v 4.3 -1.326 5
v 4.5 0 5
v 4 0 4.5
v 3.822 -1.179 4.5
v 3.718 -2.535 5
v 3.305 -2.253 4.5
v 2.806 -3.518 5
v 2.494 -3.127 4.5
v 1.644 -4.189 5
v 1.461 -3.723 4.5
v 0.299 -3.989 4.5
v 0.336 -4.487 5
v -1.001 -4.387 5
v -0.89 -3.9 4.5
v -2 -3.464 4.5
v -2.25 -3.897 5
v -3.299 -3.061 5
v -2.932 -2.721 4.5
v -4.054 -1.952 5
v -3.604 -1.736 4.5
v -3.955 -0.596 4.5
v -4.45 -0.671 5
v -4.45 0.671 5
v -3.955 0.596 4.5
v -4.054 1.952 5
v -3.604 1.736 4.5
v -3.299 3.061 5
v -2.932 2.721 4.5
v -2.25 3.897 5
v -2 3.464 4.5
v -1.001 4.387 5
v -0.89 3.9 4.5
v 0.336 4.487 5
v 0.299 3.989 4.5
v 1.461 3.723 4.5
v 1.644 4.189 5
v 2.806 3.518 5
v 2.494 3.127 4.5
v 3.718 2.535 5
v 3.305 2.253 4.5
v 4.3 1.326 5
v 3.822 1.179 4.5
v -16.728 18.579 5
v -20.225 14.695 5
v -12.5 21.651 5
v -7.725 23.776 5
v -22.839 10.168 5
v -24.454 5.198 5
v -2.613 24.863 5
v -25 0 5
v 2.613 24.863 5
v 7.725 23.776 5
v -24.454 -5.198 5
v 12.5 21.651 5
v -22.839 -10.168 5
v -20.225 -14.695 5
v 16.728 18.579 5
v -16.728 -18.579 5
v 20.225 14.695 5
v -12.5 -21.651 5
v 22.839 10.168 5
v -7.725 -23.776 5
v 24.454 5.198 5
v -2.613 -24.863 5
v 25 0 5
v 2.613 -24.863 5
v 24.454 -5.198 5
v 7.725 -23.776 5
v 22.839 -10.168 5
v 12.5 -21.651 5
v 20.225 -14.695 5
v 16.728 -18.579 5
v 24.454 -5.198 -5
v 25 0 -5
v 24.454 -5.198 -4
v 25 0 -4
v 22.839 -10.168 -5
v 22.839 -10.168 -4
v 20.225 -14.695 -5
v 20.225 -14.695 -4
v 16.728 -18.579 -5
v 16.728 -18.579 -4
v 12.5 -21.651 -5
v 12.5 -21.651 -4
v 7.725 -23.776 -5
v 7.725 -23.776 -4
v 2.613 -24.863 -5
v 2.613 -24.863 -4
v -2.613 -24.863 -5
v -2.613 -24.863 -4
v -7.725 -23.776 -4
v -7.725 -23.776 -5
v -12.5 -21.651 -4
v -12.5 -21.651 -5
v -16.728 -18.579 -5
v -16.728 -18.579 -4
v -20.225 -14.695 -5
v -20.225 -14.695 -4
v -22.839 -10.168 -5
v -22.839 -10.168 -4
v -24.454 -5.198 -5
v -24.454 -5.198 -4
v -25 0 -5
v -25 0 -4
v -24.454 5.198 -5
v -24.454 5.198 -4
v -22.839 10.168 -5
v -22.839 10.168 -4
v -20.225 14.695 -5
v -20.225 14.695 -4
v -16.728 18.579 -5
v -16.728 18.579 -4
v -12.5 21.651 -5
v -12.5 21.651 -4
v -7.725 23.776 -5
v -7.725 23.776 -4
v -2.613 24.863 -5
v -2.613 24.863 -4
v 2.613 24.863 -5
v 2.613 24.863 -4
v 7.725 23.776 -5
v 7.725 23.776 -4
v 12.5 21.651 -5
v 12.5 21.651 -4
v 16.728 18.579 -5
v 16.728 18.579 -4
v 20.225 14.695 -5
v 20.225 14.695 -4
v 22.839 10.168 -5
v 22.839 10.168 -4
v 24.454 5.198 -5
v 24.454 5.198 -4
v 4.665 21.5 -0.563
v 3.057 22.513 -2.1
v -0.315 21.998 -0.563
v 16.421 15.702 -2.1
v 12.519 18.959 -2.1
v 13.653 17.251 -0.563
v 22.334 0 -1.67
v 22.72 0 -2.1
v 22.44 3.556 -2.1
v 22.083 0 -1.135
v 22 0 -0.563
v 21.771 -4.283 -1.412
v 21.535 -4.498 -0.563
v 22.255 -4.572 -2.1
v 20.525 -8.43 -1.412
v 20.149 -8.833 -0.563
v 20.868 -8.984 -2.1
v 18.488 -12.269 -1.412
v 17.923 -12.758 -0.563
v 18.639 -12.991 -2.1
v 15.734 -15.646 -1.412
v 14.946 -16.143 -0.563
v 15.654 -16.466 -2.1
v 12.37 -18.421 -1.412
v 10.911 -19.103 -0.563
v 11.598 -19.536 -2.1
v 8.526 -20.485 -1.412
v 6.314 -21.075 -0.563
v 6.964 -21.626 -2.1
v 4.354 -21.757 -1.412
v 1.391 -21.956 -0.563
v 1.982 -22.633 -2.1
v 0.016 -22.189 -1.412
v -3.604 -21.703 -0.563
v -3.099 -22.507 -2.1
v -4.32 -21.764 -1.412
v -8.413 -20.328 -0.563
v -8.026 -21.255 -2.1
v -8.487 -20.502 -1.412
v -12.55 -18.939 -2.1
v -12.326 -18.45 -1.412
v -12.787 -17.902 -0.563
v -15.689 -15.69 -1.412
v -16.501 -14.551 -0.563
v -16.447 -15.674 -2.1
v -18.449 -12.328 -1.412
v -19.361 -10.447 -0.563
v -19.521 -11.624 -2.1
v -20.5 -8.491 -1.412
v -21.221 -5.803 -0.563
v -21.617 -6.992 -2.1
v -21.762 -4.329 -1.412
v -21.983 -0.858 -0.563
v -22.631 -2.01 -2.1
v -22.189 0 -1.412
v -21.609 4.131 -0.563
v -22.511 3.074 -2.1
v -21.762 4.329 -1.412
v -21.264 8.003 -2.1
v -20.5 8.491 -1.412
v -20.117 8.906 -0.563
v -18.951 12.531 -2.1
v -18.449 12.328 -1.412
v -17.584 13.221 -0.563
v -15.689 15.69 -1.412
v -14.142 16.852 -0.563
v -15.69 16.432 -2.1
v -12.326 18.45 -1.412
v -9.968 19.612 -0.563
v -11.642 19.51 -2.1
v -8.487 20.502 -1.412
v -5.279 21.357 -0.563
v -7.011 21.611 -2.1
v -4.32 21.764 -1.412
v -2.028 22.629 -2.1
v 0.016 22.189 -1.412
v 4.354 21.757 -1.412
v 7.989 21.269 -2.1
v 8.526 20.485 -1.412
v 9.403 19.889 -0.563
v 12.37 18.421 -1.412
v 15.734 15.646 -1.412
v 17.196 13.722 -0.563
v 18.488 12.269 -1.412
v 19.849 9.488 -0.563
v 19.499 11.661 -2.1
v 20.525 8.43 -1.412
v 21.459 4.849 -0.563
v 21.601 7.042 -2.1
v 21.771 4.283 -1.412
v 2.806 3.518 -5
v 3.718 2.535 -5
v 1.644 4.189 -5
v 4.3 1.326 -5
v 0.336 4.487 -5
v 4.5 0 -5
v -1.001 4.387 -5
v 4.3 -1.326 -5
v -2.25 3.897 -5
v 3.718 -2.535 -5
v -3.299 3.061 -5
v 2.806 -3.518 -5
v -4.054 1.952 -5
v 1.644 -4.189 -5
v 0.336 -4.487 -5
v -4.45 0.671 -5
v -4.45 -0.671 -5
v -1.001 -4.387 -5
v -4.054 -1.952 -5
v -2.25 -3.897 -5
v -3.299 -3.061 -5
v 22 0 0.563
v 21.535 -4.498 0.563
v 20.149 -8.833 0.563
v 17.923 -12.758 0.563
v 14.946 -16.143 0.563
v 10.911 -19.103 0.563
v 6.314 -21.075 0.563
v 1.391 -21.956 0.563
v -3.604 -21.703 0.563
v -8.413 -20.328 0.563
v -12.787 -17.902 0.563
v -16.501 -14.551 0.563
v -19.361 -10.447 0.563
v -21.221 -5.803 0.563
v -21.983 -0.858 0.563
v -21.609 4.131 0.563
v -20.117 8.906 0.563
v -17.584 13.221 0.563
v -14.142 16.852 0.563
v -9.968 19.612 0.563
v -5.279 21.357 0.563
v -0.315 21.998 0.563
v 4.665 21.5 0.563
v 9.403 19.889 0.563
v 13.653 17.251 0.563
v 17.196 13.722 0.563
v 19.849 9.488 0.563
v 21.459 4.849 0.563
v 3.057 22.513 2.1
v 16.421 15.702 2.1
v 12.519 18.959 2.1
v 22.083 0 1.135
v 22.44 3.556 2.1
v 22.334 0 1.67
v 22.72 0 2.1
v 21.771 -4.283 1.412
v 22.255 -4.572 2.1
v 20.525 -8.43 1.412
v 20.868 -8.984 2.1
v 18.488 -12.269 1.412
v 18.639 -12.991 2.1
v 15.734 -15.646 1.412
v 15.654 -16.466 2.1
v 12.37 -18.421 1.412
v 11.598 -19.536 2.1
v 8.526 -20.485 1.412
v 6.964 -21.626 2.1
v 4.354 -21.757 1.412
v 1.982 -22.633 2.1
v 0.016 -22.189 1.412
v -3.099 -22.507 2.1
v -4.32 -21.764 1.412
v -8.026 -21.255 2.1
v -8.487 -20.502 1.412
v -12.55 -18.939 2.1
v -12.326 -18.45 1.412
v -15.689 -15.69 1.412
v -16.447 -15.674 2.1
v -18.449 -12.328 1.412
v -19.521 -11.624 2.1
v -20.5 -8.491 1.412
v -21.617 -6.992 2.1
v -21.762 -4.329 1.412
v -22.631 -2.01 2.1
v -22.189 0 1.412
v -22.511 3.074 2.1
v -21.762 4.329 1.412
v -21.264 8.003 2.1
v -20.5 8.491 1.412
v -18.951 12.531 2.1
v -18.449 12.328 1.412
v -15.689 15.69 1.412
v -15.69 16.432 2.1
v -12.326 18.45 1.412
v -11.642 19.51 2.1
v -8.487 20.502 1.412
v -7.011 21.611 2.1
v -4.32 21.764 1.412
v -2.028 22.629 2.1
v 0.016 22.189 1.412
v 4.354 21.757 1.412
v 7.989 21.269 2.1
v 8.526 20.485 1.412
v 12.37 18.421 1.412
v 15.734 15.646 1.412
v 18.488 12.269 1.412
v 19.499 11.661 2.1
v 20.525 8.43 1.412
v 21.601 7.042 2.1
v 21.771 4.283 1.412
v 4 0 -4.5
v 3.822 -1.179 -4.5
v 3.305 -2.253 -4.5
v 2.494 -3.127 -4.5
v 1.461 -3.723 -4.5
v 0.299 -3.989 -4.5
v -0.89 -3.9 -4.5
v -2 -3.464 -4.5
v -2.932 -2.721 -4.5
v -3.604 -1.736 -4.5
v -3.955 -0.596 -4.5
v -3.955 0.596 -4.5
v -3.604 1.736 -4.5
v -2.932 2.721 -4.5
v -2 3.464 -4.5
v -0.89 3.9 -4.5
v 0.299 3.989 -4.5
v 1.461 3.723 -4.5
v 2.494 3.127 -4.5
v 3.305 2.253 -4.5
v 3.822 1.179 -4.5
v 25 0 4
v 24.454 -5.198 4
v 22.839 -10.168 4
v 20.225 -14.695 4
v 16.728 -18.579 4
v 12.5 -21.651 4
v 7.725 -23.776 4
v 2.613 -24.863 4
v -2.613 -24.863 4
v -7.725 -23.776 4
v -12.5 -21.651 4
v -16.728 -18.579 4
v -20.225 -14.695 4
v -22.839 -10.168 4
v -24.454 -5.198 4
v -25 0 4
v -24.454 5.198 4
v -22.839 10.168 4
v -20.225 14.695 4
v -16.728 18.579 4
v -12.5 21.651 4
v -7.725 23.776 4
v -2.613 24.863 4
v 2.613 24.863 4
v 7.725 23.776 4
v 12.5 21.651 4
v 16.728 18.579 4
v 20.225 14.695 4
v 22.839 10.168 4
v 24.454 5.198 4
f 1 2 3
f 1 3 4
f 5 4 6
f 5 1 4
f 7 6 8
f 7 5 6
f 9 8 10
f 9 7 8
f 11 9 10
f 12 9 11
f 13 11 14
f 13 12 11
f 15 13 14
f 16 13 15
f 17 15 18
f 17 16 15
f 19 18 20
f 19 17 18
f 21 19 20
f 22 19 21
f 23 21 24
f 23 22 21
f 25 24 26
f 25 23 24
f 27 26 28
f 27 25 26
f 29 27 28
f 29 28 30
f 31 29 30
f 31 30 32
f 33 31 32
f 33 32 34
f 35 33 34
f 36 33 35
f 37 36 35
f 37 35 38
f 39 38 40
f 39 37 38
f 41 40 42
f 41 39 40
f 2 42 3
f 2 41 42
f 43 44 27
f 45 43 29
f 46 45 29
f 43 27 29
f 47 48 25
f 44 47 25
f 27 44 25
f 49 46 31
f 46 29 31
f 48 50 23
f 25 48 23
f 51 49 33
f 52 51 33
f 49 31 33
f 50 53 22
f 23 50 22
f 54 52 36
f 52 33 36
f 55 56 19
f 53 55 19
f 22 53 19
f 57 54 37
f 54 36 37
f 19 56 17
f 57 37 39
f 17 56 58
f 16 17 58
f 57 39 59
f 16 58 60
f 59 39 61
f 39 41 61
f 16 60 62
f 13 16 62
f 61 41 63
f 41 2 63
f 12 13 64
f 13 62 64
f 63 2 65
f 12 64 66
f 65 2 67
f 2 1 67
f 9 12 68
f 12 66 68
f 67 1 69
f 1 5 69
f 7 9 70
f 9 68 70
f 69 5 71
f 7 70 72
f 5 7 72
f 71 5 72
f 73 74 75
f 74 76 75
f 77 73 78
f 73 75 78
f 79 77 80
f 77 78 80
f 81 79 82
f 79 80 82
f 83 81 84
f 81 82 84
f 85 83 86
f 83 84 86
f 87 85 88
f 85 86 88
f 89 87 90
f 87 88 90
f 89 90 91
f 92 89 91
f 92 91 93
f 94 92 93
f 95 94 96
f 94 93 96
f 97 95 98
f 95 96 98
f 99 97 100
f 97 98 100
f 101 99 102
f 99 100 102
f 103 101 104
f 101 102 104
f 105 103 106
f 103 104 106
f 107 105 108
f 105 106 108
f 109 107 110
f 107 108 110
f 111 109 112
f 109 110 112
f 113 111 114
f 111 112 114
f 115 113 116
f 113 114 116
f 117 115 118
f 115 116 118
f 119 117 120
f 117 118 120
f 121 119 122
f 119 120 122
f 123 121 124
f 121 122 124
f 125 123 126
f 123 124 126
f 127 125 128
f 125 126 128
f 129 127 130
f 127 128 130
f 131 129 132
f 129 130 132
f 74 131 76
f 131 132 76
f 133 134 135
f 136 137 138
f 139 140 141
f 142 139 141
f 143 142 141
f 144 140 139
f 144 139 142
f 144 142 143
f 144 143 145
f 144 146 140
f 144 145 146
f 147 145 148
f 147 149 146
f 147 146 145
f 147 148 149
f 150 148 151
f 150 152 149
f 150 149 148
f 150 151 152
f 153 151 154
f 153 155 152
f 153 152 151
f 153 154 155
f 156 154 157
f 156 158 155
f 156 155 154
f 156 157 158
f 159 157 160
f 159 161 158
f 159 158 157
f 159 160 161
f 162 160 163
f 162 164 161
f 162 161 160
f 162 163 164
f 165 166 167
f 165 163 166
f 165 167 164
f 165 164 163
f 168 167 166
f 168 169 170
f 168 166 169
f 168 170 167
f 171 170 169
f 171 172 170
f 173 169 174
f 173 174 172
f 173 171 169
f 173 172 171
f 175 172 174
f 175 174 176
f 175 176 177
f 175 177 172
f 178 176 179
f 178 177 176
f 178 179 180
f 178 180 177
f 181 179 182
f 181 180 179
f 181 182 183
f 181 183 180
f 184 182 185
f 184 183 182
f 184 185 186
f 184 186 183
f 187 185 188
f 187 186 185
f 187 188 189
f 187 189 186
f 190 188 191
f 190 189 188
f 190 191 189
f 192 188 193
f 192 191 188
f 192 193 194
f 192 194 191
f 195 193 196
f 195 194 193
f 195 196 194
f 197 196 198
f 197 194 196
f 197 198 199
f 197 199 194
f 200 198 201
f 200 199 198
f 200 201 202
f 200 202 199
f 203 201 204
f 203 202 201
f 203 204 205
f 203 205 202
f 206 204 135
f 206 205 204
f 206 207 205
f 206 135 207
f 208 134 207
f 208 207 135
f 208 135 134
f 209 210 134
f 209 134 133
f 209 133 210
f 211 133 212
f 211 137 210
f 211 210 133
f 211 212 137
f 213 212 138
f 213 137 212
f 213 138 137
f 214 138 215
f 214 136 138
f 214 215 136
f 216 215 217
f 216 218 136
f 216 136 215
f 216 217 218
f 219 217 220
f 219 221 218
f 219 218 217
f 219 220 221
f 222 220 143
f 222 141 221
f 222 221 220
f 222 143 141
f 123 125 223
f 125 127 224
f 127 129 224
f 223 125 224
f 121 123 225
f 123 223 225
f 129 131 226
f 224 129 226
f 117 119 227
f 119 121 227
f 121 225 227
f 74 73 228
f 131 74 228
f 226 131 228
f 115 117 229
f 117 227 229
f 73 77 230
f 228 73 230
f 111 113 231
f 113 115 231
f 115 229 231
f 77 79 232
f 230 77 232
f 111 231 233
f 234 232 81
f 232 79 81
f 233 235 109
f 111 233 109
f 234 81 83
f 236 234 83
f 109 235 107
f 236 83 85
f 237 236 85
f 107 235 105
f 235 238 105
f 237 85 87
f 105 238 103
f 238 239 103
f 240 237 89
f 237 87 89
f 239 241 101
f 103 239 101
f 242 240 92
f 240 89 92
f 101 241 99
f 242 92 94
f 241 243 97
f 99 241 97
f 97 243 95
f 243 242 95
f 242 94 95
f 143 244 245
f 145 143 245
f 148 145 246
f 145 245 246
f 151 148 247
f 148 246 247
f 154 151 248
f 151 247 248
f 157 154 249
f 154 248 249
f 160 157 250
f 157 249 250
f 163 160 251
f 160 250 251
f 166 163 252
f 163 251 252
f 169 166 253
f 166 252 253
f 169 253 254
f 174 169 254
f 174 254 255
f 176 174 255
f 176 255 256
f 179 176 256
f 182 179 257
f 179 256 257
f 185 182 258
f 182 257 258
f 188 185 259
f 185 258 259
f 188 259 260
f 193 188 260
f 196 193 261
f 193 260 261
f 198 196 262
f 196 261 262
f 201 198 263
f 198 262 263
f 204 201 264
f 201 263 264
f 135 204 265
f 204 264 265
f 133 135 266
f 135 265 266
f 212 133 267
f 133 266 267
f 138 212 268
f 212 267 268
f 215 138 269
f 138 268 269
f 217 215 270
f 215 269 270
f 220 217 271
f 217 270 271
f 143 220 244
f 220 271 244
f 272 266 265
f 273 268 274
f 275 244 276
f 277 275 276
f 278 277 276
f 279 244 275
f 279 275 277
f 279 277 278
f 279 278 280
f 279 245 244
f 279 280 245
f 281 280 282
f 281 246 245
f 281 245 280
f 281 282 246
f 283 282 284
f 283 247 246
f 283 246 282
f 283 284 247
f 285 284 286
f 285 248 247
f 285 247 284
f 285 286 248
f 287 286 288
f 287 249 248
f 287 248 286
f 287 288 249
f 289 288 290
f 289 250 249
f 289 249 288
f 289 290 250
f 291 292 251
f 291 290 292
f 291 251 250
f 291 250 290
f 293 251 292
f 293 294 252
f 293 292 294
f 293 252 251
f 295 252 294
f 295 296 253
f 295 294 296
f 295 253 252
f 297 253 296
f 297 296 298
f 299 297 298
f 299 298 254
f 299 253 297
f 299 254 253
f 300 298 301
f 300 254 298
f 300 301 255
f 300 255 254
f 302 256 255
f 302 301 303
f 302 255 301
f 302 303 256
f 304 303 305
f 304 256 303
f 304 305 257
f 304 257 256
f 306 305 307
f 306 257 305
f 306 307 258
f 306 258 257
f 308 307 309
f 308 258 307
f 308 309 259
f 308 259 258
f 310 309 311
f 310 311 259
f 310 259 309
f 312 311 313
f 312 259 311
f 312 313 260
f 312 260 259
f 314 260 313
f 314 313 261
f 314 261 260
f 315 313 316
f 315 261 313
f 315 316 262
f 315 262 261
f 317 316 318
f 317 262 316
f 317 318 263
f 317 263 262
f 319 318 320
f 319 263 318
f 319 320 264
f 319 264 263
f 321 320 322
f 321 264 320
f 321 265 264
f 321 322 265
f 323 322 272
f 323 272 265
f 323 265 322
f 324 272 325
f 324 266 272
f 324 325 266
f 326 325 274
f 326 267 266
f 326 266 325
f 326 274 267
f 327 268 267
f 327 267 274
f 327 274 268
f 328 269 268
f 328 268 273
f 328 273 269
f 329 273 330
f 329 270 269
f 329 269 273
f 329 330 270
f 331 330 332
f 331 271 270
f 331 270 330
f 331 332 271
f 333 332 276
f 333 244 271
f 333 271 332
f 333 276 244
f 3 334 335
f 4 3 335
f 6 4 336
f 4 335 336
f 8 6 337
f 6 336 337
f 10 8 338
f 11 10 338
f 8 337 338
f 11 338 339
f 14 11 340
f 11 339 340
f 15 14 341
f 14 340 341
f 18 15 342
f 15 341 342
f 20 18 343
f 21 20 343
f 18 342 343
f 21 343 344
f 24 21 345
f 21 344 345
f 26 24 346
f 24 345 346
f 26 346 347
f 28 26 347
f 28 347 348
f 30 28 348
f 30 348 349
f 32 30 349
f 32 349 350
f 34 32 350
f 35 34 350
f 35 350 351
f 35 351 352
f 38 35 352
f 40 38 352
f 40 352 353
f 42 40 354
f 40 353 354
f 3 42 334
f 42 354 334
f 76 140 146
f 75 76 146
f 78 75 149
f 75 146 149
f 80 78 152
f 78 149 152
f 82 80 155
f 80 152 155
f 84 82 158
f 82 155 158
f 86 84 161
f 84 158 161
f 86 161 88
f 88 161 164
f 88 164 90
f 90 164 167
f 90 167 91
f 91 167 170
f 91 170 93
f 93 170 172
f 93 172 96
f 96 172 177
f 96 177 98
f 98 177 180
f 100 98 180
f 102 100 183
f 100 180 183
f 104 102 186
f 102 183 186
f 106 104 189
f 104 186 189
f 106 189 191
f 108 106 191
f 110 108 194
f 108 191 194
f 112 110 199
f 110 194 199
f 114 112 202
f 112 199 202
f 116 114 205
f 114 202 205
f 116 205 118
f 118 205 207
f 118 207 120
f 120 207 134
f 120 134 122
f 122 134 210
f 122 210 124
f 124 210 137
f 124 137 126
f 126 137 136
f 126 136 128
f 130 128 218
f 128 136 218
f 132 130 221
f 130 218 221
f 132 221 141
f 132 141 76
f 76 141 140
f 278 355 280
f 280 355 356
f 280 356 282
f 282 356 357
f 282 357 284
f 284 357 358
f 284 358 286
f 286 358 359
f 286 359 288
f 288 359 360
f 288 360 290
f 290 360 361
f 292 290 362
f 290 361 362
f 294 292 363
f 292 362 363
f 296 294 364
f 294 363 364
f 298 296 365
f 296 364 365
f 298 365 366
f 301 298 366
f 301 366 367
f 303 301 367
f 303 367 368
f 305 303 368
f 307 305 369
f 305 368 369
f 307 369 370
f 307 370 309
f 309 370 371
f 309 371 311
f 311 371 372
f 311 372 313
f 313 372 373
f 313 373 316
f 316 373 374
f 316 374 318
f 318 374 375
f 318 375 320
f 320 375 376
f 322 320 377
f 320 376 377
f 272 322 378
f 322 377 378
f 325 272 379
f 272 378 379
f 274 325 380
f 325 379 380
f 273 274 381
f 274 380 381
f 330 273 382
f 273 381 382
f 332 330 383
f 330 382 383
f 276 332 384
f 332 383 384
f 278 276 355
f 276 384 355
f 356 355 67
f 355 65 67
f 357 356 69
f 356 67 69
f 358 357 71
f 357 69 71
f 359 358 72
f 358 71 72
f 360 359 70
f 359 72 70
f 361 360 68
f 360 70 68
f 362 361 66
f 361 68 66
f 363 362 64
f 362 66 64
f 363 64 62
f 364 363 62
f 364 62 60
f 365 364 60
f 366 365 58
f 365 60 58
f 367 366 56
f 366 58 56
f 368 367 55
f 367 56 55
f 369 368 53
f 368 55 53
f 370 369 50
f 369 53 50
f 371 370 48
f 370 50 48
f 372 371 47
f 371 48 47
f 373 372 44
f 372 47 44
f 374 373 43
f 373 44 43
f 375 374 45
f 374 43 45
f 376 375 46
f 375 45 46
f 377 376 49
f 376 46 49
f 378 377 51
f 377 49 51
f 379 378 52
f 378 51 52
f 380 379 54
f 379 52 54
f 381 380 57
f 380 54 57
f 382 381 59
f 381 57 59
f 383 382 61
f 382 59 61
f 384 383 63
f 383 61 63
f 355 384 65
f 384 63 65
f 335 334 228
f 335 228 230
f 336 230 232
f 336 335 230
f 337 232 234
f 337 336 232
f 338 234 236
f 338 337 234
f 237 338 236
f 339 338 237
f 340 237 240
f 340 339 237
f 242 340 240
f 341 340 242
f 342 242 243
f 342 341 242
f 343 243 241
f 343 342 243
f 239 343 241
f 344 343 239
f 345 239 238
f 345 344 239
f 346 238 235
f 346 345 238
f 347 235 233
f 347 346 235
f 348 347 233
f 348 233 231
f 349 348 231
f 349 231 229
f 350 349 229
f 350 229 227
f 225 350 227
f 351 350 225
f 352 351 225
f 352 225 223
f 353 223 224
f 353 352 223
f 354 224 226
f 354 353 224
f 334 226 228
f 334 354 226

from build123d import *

# Parameters (mm, degrees)
ZAOKR_GLENIE1_R  = 2
SFAZOWANIE1_SIZE = 0.5


with BuildPart() as part:
    # Szkic1 → Obrót1 (revolve)
    with BuildSketch(Plane(origin=(0, 0, 0), x_dir=(0, 0, -1), z_dir=(1, 0, 0)), mode=Mode.PRIVATE) as obr_t1_sk:
        Polygon((-5, 4), (5, 4), (5, 25), (4, 25), (1.5, 22), (-1.5, 22), (-4, 25), (-5, 25), align=None)
    revolve(obr_t1_sk.sketch.rotate(Axis((0, 0, 0), (0, 0, -1)), 90), axis=Axis((0, 0, 0), (0, 0, -1)))

    # Zaokrąglenie1
    zaokr_glenie1_edges = [part.edges().sort_by_distance(p)[0] for p in [
        (-22, 0, -1.5),
        (-22, 0, 1.5),
    ]]
    fillet(zaokr_glenie1_edges, radius=ZAOKR_GLENIE1_R)

    # Sfazowanie1
    sfazowanie1_edges = [part.edges().sort_by_distance(p)[0] for p in [
        (-4, 0, 5),
        (-4, 0, -5),
    ]]
    chamfer(sfazowanie1_edges, length=SFAZOWANIE1_SIZE)


solid = part.part
